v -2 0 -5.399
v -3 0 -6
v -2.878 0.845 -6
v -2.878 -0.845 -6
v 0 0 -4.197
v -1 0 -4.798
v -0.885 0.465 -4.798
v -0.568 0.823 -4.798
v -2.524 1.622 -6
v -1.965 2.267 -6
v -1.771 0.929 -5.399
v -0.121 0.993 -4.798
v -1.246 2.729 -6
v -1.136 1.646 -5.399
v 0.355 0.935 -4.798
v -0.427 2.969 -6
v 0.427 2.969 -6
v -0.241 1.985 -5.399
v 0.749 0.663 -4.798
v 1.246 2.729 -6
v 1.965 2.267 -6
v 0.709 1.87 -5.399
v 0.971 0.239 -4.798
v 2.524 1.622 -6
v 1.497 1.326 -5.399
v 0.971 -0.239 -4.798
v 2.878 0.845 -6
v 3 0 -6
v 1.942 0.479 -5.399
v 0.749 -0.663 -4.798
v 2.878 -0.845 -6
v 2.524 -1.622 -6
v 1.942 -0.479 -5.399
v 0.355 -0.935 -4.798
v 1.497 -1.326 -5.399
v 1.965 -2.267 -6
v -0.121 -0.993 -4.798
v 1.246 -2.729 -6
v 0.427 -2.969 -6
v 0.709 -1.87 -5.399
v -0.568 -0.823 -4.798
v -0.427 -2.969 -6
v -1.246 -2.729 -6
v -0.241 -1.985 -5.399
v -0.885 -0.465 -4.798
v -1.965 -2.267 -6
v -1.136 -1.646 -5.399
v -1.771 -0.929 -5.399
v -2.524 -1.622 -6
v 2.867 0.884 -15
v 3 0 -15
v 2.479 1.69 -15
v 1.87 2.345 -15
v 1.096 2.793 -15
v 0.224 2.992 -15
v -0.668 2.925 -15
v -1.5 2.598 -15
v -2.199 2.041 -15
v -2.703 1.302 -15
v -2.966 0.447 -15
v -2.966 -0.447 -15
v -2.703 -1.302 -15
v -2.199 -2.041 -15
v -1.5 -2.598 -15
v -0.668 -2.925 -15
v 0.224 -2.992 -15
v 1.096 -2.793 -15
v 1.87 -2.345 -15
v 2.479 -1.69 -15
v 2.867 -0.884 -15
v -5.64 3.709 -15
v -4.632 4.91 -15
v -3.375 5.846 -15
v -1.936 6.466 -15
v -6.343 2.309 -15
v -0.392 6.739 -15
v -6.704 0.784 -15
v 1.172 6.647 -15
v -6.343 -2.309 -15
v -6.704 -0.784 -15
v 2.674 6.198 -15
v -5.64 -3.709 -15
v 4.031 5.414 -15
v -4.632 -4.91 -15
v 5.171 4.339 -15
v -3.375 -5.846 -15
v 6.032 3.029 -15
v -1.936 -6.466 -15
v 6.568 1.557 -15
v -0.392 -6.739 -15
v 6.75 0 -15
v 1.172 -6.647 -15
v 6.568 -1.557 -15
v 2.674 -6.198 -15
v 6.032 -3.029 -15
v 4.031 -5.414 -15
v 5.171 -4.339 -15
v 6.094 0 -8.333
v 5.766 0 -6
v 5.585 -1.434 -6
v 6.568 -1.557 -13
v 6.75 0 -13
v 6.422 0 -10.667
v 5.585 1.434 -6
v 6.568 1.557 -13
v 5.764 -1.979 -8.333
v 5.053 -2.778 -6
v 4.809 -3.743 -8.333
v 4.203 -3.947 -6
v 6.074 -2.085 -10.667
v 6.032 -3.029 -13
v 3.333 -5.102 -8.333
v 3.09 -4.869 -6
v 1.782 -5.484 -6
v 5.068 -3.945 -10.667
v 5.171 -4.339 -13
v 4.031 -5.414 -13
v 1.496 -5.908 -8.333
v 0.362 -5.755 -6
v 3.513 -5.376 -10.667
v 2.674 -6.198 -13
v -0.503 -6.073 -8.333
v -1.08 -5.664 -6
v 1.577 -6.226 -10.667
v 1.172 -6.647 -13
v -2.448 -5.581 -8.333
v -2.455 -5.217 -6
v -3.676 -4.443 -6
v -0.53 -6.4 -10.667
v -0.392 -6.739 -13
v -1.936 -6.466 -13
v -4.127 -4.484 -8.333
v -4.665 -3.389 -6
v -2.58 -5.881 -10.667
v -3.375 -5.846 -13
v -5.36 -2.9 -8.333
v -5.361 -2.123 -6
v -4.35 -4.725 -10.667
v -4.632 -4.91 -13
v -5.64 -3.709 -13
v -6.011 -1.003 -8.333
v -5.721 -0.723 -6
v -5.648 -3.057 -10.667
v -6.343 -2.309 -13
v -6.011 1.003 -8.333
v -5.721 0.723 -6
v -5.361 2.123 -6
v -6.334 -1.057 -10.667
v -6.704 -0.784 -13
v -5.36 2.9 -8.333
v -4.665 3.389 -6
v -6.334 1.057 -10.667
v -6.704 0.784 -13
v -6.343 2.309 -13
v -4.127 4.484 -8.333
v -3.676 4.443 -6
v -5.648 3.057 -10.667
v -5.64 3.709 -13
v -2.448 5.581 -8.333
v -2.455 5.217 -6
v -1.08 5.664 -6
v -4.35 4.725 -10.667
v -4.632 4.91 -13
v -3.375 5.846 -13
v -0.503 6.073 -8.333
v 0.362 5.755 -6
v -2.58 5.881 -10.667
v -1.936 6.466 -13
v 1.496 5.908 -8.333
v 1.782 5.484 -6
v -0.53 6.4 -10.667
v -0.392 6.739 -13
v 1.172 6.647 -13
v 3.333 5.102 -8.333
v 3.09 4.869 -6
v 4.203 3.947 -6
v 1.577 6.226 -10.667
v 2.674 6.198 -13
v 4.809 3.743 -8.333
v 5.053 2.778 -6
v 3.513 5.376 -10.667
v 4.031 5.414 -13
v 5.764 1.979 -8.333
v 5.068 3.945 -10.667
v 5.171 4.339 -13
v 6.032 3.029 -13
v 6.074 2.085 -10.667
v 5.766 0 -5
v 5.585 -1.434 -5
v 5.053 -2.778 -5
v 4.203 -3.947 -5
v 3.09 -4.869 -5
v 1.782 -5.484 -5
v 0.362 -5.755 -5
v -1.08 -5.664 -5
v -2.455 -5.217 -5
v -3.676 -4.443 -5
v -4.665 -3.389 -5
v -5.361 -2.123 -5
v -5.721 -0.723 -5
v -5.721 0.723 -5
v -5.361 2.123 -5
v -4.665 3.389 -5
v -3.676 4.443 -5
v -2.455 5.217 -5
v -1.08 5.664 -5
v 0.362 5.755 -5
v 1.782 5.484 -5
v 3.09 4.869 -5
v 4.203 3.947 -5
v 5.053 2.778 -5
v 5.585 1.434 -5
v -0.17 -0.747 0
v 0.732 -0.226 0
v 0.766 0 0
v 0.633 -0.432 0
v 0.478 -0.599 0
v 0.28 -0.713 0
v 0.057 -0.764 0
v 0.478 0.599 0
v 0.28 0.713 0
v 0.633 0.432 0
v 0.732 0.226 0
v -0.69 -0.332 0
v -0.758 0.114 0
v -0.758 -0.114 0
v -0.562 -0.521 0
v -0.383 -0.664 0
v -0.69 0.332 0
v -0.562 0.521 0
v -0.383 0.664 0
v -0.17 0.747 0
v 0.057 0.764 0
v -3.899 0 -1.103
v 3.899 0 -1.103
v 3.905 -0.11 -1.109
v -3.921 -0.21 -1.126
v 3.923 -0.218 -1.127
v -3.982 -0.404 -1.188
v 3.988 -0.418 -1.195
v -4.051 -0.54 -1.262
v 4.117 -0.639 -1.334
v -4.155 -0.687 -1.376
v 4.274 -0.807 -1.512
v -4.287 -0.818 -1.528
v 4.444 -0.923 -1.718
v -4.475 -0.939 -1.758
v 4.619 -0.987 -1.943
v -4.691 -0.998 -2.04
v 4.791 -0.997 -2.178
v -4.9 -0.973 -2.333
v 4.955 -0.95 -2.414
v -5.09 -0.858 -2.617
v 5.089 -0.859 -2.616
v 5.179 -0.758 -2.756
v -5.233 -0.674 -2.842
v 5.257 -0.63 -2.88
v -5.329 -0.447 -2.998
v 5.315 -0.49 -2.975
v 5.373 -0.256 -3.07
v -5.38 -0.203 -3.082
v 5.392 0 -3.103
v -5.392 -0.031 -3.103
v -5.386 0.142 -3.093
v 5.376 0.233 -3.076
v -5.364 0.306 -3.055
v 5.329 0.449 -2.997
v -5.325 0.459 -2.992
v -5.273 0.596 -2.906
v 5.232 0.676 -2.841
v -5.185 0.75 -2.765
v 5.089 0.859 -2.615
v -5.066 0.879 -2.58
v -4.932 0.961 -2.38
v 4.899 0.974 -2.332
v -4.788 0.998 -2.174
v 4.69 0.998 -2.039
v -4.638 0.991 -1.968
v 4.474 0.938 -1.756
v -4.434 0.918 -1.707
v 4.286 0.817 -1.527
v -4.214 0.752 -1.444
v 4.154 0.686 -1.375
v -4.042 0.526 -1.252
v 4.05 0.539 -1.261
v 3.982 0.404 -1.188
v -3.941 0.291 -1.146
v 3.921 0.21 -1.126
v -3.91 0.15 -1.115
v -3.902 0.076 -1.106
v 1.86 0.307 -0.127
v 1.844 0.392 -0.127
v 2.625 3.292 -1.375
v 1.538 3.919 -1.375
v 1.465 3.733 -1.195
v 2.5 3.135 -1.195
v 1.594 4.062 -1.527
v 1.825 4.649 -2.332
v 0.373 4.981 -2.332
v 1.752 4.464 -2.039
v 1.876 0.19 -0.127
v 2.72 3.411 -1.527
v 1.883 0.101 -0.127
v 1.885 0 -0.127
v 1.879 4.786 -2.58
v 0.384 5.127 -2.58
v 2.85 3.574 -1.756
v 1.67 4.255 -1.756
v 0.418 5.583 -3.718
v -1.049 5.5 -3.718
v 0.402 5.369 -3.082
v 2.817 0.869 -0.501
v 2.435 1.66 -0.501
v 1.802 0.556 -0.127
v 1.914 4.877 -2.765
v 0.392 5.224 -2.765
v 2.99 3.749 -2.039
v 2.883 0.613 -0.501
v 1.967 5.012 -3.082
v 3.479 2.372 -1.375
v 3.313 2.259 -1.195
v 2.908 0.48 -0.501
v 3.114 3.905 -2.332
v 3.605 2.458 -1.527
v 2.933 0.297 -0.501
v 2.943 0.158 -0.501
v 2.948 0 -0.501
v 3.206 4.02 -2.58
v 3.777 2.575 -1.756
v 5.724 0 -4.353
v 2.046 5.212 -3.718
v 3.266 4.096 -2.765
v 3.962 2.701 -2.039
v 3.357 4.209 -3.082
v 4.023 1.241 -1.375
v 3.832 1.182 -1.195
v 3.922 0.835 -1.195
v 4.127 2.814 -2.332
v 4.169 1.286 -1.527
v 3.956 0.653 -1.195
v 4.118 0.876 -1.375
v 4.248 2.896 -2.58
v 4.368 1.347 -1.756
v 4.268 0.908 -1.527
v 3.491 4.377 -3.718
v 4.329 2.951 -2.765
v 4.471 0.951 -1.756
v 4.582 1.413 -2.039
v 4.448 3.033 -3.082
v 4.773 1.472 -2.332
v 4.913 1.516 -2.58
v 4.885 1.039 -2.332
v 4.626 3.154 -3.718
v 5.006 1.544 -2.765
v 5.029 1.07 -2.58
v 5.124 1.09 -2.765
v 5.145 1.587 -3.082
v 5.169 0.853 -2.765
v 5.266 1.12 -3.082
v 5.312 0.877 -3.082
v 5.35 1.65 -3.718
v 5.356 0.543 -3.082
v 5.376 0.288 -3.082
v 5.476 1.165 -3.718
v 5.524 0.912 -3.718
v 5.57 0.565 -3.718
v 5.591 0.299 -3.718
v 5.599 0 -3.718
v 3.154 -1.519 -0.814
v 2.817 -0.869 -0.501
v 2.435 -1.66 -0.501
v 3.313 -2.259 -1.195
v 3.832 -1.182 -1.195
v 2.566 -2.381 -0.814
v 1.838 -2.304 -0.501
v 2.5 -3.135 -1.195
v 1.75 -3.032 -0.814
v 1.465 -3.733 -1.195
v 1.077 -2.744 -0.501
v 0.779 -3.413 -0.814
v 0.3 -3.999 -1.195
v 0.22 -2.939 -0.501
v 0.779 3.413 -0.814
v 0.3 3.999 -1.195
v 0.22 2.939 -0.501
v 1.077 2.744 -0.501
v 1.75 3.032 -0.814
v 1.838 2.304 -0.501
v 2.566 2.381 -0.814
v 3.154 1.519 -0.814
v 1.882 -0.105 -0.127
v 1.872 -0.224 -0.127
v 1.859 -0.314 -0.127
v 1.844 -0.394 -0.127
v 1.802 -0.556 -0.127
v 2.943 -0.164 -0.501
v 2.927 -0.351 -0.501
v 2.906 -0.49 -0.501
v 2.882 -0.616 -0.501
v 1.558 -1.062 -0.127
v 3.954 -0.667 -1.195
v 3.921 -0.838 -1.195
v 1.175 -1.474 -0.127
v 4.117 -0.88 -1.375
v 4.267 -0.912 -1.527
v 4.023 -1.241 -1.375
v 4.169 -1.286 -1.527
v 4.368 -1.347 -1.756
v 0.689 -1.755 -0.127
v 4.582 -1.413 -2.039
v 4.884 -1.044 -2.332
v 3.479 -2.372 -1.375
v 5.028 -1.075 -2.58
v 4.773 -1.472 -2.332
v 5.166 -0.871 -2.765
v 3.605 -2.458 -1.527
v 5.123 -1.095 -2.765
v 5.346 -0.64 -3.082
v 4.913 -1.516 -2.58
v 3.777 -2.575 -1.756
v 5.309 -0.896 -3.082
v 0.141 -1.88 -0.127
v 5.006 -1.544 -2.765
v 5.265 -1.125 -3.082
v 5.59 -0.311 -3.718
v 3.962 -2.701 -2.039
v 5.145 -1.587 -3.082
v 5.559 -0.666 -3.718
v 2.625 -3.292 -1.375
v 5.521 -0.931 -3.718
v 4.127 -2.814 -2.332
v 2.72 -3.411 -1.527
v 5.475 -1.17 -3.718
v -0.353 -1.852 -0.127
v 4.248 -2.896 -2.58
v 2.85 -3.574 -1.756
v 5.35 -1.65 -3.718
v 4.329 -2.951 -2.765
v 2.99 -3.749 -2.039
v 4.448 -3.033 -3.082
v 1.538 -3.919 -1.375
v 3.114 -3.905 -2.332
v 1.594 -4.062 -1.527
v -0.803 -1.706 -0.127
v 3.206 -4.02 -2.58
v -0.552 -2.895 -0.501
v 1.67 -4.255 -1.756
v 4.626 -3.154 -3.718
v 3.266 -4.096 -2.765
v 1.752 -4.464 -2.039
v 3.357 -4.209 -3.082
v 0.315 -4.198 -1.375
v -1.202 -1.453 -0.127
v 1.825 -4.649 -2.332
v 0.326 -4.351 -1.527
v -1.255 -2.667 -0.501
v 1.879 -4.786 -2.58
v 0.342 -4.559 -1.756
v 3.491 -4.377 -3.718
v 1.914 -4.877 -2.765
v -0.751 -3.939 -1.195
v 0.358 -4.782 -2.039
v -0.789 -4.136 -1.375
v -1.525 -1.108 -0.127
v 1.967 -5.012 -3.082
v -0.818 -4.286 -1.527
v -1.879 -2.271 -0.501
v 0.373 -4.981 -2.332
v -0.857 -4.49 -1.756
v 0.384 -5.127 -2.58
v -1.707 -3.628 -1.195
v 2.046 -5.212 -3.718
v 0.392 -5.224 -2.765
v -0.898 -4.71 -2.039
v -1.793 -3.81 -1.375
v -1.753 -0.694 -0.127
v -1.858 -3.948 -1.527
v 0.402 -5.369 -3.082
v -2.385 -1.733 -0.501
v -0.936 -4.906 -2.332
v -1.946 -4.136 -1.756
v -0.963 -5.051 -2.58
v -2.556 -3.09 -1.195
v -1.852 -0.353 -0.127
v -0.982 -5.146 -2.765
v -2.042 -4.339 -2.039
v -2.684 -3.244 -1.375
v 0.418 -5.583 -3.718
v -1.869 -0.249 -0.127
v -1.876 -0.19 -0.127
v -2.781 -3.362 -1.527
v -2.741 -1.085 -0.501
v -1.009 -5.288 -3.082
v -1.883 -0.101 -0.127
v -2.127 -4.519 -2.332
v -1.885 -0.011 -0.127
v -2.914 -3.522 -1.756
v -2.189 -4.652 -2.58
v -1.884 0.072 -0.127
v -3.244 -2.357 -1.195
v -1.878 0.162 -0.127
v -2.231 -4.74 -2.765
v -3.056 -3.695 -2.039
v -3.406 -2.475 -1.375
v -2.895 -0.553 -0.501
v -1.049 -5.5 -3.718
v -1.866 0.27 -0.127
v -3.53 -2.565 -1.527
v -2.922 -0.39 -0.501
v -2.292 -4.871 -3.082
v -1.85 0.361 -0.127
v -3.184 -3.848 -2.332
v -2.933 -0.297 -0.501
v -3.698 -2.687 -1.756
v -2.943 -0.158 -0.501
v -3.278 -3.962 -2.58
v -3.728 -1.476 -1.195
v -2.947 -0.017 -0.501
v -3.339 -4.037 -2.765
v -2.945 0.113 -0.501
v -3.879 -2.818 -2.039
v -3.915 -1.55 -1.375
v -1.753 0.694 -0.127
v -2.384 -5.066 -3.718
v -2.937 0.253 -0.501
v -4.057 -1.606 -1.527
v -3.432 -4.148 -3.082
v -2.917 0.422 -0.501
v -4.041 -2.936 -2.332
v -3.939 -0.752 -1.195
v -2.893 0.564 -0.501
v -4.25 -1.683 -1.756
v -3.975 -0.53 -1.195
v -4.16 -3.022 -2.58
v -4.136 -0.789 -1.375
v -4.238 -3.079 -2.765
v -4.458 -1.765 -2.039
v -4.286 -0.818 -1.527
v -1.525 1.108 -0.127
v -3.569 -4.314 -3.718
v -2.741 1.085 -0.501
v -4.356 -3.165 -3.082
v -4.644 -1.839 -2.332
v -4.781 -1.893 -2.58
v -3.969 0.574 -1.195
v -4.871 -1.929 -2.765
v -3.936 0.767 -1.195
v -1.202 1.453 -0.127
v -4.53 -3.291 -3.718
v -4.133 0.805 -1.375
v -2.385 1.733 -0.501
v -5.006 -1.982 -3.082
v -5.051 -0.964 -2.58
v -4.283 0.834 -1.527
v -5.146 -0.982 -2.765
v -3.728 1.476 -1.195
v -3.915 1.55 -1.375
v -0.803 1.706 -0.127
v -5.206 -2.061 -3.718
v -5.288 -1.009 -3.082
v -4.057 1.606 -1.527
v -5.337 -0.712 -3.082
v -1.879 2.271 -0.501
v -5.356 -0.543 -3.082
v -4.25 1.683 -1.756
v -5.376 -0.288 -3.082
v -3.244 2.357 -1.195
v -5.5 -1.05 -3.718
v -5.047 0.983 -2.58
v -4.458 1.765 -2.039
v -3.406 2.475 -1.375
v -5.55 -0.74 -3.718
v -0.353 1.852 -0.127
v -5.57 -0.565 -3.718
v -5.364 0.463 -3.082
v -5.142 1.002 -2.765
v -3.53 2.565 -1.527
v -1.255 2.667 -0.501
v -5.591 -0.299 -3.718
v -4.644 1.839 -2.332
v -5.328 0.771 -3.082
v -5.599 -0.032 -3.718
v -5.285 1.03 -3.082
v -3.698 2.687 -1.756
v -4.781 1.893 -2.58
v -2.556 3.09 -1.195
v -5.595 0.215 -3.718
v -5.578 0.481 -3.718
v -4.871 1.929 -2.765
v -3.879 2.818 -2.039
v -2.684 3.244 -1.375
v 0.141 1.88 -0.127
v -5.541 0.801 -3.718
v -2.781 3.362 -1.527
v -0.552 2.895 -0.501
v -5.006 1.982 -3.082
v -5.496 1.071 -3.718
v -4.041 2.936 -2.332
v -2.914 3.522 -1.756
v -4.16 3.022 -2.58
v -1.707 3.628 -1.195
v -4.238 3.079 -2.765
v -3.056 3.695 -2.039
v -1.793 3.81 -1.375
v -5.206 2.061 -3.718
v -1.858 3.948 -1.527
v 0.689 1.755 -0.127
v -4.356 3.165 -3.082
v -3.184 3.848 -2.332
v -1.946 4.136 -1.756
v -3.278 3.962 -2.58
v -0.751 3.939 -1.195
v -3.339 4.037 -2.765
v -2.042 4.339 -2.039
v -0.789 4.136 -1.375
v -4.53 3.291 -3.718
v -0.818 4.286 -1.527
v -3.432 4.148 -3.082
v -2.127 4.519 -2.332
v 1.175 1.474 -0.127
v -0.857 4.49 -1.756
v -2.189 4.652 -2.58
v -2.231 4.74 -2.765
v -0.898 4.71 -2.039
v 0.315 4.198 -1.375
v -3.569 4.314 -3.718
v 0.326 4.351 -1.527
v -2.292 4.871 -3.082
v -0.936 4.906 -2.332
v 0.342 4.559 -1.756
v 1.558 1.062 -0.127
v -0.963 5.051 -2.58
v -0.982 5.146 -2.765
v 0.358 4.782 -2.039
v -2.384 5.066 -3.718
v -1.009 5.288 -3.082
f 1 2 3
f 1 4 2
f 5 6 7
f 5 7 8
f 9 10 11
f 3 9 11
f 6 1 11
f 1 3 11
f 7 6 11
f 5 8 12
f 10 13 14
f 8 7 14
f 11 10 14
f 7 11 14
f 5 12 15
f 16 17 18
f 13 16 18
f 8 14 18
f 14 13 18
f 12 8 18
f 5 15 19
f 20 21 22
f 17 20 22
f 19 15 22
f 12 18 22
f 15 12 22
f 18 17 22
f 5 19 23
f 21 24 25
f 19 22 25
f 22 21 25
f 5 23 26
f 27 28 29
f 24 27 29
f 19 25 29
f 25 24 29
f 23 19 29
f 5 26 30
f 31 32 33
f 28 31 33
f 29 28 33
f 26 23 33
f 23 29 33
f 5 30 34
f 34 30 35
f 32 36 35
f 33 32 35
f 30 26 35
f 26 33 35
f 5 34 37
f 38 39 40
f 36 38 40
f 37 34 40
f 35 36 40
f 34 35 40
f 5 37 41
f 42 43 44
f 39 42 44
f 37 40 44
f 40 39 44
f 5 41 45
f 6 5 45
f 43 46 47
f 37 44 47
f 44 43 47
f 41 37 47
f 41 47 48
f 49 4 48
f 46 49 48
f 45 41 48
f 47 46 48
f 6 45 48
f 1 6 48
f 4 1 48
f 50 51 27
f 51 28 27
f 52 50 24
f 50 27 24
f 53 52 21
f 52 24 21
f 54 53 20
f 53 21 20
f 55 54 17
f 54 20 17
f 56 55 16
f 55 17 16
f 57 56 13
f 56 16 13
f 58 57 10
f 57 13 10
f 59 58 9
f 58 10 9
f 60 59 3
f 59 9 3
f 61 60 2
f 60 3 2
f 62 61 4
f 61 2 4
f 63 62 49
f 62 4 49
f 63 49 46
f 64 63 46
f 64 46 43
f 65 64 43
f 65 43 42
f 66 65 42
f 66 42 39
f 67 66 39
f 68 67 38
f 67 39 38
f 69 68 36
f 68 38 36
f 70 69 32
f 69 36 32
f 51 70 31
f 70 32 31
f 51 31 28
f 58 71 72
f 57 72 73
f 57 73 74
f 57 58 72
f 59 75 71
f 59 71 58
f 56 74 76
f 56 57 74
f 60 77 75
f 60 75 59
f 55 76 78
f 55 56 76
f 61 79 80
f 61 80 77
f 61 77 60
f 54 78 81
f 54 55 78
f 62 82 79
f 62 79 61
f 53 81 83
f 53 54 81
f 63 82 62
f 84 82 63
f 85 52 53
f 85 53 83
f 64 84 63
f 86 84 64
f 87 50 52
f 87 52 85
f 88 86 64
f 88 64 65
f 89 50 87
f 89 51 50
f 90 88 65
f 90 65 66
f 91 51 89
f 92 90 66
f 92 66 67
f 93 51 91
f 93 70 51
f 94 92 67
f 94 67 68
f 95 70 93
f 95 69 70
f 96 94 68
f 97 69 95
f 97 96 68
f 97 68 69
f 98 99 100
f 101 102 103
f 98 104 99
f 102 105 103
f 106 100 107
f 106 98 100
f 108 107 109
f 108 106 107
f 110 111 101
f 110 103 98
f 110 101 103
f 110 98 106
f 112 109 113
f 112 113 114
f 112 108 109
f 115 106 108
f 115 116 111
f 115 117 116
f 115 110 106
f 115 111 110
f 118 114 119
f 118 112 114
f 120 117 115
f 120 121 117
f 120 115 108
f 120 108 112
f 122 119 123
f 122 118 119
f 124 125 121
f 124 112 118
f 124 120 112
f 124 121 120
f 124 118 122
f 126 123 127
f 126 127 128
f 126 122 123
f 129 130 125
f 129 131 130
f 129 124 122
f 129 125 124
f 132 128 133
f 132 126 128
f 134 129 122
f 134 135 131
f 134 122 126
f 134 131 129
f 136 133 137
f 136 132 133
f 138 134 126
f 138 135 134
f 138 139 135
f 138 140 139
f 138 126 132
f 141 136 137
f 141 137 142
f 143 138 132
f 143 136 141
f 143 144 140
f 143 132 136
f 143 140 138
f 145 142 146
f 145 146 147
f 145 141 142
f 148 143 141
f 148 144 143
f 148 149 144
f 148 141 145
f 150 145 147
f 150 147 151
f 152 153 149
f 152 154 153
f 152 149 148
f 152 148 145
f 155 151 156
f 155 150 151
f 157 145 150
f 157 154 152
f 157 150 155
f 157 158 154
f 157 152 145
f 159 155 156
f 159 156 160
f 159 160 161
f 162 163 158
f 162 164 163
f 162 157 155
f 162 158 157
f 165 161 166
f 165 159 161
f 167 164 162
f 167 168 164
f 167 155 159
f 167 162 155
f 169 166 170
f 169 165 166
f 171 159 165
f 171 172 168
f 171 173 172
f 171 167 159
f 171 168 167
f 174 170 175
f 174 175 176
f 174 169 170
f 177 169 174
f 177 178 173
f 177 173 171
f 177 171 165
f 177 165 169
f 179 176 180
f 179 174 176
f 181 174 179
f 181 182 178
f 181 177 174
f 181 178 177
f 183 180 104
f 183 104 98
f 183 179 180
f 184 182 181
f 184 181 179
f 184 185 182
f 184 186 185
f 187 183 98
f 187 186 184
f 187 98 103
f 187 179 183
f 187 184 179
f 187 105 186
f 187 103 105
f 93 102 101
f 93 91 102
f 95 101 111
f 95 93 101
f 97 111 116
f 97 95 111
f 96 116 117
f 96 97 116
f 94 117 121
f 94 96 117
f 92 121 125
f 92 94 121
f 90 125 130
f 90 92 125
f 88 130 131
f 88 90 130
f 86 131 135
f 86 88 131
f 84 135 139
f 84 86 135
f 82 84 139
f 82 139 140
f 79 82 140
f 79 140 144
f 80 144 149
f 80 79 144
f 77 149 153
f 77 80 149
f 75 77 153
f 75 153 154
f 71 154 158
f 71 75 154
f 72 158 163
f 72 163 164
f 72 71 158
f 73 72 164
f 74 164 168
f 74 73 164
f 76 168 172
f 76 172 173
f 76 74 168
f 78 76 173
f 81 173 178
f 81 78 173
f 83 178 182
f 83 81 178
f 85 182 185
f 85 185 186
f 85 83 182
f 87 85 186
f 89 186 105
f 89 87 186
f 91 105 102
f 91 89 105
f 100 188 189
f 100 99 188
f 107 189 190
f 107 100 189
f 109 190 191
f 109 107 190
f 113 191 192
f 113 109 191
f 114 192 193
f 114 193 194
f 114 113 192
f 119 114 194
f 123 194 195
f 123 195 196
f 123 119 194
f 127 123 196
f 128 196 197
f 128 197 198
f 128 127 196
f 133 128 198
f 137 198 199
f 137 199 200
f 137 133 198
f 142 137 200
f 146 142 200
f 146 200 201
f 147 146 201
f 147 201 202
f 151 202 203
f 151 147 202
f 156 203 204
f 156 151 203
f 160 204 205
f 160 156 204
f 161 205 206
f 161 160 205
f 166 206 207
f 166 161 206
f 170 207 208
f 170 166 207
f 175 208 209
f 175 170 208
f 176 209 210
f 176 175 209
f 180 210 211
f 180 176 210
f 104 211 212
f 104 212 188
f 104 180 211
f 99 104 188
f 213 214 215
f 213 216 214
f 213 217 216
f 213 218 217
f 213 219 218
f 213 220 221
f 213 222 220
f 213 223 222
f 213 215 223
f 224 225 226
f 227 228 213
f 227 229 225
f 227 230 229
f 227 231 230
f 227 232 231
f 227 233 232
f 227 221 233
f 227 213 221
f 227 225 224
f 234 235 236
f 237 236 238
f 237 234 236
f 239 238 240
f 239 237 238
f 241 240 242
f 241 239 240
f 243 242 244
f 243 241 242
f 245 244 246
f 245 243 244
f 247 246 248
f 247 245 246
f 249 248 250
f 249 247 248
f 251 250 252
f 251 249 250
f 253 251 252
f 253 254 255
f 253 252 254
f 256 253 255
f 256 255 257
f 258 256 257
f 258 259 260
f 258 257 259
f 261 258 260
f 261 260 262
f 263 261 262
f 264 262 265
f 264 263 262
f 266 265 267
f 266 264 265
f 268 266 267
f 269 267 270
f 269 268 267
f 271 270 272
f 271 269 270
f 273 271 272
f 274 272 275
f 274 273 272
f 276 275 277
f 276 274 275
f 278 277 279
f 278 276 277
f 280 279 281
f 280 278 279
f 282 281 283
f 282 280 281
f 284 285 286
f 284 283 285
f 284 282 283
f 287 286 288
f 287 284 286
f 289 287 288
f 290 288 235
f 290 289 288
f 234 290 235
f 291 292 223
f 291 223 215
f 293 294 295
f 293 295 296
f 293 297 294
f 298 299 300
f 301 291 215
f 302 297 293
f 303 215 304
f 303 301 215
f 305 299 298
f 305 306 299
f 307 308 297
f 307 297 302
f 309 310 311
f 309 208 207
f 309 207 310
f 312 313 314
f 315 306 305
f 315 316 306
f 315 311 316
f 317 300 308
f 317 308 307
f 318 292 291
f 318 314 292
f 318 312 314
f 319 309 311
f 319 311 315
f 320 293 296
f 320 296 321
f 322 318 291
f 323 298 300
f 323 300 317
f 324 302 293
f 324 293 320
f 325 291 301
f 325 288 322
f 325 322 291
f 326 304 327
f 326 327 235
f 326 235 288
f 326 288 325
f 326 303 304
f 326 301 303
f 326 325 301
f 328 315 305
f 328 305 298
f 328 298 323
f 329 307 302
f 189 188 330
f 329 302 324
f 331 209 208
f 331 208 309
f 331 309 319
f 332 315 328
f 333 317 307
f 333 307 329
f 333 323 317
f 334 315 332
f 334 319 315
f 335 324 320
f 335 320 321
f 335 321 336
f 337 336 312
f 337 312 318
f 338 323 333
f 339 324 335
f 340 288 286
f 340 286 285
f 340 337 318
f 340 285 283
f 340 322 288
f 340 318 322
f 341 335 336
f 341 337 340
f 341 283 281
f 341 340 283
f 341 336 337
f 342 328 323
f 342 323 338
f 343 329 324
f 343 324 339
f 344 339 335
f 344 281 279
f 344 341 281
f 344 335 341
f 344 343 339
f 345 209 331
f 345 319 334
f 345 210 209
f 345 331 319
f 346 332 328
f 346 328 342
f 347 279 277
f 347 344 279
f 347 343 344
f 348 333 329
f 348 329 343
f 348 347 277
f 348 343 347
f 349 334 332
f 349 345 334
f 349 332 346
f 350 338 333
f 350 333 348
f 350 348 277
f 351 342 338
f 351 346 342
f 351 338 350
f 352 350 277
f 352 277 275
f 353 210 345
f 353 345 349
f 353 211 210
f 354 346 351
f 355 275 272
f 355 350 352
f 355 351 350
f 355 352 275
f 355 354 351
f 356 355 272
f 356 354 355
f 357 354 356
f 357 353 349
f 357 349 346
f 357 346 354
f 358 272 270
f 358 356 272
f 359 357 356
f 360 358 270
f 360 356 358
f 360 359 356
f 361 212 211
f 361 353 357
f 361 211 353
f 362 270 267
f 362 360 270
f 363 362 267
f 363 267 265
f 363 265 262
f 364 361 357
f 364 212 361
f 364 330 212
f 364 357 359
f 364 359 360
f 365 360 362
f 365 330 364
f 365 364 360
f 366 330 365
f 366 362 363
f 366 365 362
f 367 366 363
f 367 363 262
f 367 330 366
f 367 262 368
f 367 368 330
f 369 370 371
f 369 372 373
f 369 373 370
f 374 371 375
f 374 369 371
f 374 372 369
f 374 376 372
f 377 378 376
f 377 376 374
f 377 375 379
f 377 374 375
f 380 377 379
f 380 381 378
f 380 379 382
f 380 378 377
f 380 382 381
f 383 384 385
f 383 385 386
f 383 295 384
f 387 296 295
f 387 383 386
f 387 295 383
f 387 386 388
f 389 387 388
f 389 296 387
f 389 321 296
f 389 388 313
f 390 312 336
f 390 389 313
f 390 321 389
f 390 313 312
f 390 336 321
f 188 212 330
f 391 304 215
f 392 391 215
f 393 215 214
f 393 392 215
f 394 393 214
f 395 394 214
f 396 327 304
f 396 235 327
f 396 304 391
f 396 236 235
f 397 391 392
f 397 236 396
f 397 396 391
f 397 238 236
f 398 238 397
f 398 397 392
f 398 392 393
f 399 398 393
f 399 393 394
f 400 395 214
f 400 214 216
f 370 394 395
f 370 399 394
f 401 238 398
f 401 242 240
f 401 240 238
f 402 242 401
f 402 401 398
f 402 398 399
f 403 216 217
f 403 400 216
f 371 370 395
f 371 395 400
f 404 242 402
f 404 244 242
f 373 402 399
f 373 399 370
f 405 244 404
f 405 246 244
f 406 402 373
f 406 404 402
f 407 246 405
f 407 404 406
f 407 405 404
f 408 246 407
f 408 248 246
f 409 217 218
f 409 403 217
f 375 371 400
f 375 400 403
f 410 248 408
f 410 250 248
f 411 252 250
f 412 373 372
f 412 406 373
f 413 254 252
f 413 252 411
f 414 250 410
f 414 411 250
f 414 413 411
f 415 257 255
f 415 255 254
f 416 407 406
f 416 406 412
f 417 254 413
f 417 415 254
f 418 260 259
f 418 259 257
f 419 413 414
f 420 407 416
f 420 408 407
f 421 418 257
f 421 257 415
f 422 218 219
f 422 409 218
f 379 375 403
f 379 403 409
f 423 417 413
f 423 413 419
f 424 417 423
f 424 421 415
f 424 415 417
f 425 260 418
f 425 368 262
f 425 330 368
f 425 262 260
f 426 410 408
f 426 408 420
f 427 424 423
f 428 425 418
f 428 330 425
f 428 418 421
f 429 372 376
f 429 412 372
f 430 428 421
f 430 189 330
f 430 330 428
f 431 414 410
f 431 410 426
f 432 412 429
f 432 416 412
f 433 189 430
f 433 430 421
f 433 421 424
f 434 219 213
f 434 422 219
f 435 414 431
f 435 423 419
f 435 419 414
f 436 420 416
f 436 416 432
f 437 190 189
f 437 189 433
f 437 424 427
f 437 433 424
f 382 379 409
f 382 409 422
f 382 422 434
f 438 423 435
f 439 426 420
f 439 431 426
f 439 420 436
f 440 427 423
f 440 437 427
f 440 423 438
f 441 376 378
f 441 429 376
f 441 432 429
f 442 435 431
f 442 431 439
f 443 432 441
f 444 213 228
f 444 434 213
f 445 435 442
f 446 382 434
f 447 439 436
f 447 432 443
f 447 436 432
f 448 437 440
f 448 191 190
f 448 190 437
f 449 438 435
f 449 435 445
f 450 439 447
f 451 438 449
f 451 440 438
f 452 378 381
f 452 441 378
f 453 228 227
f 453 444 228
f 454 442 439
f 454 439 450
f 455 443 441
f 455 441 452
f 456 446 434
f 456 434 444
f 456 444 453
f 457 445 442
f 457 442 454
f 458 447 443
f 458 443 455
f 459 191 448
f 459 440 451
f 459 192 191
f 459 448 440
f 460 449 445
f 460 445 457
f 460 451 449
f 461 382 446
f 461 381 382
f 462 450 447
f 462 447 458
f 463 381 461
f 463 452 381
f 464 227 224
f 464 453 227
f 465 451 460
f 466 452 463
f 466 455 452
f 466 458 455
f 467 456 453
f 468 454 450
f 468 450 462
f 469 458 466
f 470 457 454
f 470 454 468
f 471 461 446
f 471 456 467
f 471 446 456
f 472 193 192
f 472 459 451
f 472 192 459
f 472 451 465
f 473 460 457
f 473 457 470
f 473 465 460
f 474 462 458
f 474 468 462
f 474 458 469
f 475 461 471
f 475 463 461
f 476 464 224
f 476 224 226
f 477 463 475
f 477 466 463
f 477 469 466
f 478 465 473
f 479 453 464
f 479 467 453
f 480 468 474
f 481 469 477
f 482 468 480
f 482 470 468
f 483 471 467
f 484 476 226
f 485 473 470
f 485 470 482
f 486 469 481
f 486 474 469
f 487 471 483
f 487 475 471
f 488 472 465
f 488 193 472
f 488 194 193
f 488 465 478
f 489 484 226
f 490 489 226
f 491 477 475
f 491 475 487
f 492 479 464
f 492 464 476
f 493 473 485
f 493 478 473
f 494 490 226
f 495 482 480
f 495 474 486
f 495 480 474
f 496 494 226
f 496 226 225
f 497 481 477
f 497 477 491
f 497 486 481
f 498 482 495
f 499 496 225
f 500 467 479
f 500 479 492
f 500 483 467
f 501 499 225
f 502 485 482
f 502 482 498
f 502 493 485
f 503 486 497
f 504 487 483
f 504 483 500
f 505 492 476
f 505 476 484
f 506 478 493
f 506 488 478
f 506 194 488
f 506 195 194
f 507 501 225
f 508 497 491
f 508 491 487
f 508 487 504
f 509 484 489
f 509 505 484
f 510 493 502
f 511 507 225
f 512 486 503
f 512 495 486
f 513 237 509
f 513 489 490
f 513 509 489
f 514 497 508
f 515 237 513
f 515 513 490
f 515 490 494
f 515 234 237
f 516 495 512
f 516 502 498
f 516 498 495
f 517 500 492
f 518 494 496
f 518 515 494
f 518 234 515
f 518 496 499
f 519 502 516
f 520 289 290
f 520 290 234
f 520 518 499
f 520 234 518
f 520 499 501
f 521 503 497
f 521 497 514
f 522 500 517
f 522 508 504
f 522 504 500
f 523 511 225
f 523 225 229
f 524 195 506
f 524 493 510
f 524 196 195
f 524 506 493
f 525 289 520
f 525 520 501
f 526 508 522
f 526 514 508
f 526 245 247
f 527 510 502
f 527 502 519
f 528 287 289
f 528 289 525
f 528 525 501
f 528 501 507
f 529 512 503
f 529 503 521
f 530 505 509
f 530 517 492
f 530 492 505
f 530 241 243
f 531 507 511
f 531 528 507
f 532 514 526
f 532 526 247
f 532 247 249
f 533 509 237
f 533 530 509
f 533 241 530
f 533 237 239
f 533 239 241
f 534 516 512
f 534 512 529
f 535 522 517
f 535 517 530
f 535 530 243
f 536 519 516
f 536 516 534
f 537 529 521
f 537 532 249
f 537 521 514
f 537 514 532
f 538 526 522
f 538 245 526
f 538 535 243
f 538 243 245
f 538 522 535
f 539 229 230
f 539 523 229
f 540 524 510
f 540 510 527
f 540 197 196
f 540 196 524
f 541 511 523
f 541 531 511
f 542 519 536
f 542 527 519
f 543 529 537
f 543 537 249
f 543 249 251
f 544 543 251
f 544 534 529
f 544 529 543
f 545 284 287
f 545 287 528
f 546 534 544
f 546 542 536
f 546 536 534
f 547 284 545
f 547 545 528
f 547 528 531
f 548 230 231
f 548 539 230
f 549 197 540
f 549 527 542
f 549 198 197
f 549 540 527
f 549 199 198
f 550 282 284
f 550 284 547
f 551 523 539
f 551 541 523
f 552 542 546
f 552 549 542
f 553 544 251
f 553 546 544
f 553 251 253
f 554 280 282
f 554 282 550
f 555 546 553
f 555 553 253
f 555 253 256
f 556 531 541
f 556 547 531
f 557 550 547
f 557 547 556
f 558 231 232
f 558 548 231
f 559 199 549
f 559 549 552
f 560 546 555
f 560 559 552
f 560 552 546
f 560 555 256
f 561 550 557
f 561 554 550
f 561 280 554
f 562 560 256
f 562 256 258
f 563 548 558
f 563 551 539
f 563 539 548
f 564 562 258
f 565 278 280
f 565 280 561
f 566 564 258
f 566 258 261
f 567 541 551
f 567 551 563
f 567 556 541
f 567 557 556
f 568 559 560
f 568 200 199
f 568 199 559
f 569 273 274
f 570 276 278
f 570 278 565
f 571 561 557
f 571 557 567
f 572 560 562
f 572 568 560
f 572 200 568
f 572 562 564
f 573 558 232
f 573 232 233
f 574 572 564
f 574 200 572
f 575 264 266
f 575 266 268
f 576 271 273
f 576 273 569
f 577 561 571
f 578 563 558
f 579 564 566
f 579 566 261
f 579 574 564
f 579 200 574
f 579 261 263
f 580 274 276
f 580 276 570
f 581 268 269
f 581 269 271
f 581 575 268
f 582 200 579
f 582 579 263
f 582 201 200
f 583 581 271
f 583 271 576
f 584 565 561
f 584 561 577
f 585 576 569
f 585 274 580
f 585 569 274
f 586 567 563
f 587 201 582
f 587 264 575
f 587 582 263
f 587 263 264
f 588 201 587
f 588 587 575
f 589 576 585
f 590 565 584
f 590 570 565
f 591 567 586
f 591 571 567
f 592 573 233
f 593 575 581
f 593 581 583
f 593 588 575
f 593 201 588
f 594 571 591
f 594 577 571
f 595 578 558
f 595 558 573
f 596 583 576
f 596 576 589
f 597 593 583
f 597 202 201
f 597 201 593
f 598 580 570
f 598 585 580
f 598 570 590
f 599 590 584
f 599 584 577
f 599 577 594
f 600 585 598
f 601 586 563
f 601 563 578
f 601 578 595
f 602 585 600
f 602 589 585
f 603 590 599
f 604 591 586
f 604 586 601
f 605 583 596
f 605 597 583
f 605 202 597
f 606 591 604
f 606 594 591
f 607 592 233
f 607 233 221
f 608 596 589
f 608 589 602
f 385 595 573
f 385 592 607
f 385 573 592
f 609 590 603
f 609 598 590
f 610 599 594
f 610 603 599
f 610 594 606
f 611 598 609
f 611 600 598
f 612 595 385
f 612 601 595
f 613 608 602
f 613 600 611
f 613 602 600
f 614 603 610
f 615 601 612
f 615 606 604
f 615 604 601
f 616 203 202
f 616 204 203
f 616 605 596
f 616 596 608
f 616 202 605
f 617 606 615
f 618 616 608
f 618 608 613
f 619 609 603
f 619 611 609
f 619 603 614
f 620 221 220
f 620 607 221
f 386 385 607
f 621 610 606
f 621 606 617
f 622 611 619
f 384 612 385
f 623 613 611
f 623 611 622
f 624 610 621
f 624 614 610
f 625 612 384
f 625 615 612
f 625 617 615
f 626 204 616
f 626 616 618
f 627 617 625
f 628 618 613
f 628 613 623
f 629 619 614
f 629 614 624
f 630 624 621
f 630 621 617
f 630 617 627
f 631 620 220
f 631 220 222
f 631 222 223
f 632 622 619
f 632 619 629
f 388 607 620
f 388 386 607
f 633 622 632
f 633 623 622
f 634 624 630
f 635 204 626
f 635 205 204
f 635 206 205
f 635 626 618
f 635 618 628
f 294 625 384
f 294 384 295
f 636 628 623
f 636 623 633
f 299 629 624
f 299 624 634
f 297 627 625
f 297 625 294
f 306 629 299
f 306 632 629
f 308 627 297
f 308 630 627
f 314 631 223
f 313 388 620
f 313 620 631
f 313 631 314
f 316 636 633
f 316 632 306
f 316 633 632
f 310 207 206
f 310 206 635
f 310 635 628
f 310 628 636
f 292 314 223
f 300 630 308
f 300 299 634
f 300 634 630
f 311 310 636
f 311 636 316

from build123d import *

# Parameters (mm, degrees)
F_6_0MM_DOWEL_HOLE1_D     = 6
F_6_0MM_DOWEL_HOLE1_DEPTH = 9
F_6_0MM_DOWEL_HOLE1_TIP   = 1.802581857
CUT_EXTRUDE1_DEPTH        = 10
CUT_EXTRUDE1_DEPTH_BACK   = 10
SKETCH4_R                 = 1


with BuildPart() as part:
    # Sketch1 → Revolve1 (revolve)
    with BuildSketch(Plane(origin=(0, 0, 0), x_dir=(1, 0, 0), z_dir=(0, 1, 0))):
        with BuildLine():
            Line((0, 0), (-0.766214157, 0))
            ThreePointArc((-0.766214157, 0), (-4.301748063, 1.464466094), (-5.766214157, 5))
            Line((-5.766214157, 5), (-5.766214157, 6))
            Line((-5.766214157, 6), (-6.75, 13))
            Line((-6.75, 13), (-6.75, 15))
            Line((-6.75, 15), (0, 15))
            Line((0, 15), (0, 0))
        make_face()
    revolve(axis=Axis((0, 0, 0), (0, 0, -1)))

    # Ø6.0mm Dowel Hole1
    with Locations(Plane(origin=(0, 0, -15), x_dir=(-1, 0, 0), z_dir=(0, 0, -1))):
        with Locations((0, 0)):
            Hole(F_6_0MM_DOWEL_HOLE1_D / 2, depth=F_6_0MM_DOWEL_HOLE1_DEPTH)
            with Locations((0, 0, -(F_6_0MM_DOWEL_HOLE1_DEPTH + F_6_0MM_DOWEL_HOLE1_TIP / 2))):  # 118° drill point
                Cone(0, F_6_0MM_DOWEL_HOLE1_D / 2, F_6_0MM_DOWEL_HOLE1_TIP, mode=Mode.SUBTRACT)

    # Sketch4 → Cut-Extrude1 (cut, two sides: drawn at the far end of the back side and taken through both)
    with BuildSketch(Plane(origin=(0, 0, 0), x_dir=(0, 0, -1), z_dir=(1, 0, 0)).offset(-CUT_EXTRUDE1_DEPTH_BACK)):
        with Locations((2.103245374, 0)):
            Circle(SKETCH4_R)
    extrude(amount=CUT_EXTRUDE1_DEPTH + CUT_EXTRUDE1_DEPTH_BACK, mode=Mode.SUBTRACT)


solid = part.part
